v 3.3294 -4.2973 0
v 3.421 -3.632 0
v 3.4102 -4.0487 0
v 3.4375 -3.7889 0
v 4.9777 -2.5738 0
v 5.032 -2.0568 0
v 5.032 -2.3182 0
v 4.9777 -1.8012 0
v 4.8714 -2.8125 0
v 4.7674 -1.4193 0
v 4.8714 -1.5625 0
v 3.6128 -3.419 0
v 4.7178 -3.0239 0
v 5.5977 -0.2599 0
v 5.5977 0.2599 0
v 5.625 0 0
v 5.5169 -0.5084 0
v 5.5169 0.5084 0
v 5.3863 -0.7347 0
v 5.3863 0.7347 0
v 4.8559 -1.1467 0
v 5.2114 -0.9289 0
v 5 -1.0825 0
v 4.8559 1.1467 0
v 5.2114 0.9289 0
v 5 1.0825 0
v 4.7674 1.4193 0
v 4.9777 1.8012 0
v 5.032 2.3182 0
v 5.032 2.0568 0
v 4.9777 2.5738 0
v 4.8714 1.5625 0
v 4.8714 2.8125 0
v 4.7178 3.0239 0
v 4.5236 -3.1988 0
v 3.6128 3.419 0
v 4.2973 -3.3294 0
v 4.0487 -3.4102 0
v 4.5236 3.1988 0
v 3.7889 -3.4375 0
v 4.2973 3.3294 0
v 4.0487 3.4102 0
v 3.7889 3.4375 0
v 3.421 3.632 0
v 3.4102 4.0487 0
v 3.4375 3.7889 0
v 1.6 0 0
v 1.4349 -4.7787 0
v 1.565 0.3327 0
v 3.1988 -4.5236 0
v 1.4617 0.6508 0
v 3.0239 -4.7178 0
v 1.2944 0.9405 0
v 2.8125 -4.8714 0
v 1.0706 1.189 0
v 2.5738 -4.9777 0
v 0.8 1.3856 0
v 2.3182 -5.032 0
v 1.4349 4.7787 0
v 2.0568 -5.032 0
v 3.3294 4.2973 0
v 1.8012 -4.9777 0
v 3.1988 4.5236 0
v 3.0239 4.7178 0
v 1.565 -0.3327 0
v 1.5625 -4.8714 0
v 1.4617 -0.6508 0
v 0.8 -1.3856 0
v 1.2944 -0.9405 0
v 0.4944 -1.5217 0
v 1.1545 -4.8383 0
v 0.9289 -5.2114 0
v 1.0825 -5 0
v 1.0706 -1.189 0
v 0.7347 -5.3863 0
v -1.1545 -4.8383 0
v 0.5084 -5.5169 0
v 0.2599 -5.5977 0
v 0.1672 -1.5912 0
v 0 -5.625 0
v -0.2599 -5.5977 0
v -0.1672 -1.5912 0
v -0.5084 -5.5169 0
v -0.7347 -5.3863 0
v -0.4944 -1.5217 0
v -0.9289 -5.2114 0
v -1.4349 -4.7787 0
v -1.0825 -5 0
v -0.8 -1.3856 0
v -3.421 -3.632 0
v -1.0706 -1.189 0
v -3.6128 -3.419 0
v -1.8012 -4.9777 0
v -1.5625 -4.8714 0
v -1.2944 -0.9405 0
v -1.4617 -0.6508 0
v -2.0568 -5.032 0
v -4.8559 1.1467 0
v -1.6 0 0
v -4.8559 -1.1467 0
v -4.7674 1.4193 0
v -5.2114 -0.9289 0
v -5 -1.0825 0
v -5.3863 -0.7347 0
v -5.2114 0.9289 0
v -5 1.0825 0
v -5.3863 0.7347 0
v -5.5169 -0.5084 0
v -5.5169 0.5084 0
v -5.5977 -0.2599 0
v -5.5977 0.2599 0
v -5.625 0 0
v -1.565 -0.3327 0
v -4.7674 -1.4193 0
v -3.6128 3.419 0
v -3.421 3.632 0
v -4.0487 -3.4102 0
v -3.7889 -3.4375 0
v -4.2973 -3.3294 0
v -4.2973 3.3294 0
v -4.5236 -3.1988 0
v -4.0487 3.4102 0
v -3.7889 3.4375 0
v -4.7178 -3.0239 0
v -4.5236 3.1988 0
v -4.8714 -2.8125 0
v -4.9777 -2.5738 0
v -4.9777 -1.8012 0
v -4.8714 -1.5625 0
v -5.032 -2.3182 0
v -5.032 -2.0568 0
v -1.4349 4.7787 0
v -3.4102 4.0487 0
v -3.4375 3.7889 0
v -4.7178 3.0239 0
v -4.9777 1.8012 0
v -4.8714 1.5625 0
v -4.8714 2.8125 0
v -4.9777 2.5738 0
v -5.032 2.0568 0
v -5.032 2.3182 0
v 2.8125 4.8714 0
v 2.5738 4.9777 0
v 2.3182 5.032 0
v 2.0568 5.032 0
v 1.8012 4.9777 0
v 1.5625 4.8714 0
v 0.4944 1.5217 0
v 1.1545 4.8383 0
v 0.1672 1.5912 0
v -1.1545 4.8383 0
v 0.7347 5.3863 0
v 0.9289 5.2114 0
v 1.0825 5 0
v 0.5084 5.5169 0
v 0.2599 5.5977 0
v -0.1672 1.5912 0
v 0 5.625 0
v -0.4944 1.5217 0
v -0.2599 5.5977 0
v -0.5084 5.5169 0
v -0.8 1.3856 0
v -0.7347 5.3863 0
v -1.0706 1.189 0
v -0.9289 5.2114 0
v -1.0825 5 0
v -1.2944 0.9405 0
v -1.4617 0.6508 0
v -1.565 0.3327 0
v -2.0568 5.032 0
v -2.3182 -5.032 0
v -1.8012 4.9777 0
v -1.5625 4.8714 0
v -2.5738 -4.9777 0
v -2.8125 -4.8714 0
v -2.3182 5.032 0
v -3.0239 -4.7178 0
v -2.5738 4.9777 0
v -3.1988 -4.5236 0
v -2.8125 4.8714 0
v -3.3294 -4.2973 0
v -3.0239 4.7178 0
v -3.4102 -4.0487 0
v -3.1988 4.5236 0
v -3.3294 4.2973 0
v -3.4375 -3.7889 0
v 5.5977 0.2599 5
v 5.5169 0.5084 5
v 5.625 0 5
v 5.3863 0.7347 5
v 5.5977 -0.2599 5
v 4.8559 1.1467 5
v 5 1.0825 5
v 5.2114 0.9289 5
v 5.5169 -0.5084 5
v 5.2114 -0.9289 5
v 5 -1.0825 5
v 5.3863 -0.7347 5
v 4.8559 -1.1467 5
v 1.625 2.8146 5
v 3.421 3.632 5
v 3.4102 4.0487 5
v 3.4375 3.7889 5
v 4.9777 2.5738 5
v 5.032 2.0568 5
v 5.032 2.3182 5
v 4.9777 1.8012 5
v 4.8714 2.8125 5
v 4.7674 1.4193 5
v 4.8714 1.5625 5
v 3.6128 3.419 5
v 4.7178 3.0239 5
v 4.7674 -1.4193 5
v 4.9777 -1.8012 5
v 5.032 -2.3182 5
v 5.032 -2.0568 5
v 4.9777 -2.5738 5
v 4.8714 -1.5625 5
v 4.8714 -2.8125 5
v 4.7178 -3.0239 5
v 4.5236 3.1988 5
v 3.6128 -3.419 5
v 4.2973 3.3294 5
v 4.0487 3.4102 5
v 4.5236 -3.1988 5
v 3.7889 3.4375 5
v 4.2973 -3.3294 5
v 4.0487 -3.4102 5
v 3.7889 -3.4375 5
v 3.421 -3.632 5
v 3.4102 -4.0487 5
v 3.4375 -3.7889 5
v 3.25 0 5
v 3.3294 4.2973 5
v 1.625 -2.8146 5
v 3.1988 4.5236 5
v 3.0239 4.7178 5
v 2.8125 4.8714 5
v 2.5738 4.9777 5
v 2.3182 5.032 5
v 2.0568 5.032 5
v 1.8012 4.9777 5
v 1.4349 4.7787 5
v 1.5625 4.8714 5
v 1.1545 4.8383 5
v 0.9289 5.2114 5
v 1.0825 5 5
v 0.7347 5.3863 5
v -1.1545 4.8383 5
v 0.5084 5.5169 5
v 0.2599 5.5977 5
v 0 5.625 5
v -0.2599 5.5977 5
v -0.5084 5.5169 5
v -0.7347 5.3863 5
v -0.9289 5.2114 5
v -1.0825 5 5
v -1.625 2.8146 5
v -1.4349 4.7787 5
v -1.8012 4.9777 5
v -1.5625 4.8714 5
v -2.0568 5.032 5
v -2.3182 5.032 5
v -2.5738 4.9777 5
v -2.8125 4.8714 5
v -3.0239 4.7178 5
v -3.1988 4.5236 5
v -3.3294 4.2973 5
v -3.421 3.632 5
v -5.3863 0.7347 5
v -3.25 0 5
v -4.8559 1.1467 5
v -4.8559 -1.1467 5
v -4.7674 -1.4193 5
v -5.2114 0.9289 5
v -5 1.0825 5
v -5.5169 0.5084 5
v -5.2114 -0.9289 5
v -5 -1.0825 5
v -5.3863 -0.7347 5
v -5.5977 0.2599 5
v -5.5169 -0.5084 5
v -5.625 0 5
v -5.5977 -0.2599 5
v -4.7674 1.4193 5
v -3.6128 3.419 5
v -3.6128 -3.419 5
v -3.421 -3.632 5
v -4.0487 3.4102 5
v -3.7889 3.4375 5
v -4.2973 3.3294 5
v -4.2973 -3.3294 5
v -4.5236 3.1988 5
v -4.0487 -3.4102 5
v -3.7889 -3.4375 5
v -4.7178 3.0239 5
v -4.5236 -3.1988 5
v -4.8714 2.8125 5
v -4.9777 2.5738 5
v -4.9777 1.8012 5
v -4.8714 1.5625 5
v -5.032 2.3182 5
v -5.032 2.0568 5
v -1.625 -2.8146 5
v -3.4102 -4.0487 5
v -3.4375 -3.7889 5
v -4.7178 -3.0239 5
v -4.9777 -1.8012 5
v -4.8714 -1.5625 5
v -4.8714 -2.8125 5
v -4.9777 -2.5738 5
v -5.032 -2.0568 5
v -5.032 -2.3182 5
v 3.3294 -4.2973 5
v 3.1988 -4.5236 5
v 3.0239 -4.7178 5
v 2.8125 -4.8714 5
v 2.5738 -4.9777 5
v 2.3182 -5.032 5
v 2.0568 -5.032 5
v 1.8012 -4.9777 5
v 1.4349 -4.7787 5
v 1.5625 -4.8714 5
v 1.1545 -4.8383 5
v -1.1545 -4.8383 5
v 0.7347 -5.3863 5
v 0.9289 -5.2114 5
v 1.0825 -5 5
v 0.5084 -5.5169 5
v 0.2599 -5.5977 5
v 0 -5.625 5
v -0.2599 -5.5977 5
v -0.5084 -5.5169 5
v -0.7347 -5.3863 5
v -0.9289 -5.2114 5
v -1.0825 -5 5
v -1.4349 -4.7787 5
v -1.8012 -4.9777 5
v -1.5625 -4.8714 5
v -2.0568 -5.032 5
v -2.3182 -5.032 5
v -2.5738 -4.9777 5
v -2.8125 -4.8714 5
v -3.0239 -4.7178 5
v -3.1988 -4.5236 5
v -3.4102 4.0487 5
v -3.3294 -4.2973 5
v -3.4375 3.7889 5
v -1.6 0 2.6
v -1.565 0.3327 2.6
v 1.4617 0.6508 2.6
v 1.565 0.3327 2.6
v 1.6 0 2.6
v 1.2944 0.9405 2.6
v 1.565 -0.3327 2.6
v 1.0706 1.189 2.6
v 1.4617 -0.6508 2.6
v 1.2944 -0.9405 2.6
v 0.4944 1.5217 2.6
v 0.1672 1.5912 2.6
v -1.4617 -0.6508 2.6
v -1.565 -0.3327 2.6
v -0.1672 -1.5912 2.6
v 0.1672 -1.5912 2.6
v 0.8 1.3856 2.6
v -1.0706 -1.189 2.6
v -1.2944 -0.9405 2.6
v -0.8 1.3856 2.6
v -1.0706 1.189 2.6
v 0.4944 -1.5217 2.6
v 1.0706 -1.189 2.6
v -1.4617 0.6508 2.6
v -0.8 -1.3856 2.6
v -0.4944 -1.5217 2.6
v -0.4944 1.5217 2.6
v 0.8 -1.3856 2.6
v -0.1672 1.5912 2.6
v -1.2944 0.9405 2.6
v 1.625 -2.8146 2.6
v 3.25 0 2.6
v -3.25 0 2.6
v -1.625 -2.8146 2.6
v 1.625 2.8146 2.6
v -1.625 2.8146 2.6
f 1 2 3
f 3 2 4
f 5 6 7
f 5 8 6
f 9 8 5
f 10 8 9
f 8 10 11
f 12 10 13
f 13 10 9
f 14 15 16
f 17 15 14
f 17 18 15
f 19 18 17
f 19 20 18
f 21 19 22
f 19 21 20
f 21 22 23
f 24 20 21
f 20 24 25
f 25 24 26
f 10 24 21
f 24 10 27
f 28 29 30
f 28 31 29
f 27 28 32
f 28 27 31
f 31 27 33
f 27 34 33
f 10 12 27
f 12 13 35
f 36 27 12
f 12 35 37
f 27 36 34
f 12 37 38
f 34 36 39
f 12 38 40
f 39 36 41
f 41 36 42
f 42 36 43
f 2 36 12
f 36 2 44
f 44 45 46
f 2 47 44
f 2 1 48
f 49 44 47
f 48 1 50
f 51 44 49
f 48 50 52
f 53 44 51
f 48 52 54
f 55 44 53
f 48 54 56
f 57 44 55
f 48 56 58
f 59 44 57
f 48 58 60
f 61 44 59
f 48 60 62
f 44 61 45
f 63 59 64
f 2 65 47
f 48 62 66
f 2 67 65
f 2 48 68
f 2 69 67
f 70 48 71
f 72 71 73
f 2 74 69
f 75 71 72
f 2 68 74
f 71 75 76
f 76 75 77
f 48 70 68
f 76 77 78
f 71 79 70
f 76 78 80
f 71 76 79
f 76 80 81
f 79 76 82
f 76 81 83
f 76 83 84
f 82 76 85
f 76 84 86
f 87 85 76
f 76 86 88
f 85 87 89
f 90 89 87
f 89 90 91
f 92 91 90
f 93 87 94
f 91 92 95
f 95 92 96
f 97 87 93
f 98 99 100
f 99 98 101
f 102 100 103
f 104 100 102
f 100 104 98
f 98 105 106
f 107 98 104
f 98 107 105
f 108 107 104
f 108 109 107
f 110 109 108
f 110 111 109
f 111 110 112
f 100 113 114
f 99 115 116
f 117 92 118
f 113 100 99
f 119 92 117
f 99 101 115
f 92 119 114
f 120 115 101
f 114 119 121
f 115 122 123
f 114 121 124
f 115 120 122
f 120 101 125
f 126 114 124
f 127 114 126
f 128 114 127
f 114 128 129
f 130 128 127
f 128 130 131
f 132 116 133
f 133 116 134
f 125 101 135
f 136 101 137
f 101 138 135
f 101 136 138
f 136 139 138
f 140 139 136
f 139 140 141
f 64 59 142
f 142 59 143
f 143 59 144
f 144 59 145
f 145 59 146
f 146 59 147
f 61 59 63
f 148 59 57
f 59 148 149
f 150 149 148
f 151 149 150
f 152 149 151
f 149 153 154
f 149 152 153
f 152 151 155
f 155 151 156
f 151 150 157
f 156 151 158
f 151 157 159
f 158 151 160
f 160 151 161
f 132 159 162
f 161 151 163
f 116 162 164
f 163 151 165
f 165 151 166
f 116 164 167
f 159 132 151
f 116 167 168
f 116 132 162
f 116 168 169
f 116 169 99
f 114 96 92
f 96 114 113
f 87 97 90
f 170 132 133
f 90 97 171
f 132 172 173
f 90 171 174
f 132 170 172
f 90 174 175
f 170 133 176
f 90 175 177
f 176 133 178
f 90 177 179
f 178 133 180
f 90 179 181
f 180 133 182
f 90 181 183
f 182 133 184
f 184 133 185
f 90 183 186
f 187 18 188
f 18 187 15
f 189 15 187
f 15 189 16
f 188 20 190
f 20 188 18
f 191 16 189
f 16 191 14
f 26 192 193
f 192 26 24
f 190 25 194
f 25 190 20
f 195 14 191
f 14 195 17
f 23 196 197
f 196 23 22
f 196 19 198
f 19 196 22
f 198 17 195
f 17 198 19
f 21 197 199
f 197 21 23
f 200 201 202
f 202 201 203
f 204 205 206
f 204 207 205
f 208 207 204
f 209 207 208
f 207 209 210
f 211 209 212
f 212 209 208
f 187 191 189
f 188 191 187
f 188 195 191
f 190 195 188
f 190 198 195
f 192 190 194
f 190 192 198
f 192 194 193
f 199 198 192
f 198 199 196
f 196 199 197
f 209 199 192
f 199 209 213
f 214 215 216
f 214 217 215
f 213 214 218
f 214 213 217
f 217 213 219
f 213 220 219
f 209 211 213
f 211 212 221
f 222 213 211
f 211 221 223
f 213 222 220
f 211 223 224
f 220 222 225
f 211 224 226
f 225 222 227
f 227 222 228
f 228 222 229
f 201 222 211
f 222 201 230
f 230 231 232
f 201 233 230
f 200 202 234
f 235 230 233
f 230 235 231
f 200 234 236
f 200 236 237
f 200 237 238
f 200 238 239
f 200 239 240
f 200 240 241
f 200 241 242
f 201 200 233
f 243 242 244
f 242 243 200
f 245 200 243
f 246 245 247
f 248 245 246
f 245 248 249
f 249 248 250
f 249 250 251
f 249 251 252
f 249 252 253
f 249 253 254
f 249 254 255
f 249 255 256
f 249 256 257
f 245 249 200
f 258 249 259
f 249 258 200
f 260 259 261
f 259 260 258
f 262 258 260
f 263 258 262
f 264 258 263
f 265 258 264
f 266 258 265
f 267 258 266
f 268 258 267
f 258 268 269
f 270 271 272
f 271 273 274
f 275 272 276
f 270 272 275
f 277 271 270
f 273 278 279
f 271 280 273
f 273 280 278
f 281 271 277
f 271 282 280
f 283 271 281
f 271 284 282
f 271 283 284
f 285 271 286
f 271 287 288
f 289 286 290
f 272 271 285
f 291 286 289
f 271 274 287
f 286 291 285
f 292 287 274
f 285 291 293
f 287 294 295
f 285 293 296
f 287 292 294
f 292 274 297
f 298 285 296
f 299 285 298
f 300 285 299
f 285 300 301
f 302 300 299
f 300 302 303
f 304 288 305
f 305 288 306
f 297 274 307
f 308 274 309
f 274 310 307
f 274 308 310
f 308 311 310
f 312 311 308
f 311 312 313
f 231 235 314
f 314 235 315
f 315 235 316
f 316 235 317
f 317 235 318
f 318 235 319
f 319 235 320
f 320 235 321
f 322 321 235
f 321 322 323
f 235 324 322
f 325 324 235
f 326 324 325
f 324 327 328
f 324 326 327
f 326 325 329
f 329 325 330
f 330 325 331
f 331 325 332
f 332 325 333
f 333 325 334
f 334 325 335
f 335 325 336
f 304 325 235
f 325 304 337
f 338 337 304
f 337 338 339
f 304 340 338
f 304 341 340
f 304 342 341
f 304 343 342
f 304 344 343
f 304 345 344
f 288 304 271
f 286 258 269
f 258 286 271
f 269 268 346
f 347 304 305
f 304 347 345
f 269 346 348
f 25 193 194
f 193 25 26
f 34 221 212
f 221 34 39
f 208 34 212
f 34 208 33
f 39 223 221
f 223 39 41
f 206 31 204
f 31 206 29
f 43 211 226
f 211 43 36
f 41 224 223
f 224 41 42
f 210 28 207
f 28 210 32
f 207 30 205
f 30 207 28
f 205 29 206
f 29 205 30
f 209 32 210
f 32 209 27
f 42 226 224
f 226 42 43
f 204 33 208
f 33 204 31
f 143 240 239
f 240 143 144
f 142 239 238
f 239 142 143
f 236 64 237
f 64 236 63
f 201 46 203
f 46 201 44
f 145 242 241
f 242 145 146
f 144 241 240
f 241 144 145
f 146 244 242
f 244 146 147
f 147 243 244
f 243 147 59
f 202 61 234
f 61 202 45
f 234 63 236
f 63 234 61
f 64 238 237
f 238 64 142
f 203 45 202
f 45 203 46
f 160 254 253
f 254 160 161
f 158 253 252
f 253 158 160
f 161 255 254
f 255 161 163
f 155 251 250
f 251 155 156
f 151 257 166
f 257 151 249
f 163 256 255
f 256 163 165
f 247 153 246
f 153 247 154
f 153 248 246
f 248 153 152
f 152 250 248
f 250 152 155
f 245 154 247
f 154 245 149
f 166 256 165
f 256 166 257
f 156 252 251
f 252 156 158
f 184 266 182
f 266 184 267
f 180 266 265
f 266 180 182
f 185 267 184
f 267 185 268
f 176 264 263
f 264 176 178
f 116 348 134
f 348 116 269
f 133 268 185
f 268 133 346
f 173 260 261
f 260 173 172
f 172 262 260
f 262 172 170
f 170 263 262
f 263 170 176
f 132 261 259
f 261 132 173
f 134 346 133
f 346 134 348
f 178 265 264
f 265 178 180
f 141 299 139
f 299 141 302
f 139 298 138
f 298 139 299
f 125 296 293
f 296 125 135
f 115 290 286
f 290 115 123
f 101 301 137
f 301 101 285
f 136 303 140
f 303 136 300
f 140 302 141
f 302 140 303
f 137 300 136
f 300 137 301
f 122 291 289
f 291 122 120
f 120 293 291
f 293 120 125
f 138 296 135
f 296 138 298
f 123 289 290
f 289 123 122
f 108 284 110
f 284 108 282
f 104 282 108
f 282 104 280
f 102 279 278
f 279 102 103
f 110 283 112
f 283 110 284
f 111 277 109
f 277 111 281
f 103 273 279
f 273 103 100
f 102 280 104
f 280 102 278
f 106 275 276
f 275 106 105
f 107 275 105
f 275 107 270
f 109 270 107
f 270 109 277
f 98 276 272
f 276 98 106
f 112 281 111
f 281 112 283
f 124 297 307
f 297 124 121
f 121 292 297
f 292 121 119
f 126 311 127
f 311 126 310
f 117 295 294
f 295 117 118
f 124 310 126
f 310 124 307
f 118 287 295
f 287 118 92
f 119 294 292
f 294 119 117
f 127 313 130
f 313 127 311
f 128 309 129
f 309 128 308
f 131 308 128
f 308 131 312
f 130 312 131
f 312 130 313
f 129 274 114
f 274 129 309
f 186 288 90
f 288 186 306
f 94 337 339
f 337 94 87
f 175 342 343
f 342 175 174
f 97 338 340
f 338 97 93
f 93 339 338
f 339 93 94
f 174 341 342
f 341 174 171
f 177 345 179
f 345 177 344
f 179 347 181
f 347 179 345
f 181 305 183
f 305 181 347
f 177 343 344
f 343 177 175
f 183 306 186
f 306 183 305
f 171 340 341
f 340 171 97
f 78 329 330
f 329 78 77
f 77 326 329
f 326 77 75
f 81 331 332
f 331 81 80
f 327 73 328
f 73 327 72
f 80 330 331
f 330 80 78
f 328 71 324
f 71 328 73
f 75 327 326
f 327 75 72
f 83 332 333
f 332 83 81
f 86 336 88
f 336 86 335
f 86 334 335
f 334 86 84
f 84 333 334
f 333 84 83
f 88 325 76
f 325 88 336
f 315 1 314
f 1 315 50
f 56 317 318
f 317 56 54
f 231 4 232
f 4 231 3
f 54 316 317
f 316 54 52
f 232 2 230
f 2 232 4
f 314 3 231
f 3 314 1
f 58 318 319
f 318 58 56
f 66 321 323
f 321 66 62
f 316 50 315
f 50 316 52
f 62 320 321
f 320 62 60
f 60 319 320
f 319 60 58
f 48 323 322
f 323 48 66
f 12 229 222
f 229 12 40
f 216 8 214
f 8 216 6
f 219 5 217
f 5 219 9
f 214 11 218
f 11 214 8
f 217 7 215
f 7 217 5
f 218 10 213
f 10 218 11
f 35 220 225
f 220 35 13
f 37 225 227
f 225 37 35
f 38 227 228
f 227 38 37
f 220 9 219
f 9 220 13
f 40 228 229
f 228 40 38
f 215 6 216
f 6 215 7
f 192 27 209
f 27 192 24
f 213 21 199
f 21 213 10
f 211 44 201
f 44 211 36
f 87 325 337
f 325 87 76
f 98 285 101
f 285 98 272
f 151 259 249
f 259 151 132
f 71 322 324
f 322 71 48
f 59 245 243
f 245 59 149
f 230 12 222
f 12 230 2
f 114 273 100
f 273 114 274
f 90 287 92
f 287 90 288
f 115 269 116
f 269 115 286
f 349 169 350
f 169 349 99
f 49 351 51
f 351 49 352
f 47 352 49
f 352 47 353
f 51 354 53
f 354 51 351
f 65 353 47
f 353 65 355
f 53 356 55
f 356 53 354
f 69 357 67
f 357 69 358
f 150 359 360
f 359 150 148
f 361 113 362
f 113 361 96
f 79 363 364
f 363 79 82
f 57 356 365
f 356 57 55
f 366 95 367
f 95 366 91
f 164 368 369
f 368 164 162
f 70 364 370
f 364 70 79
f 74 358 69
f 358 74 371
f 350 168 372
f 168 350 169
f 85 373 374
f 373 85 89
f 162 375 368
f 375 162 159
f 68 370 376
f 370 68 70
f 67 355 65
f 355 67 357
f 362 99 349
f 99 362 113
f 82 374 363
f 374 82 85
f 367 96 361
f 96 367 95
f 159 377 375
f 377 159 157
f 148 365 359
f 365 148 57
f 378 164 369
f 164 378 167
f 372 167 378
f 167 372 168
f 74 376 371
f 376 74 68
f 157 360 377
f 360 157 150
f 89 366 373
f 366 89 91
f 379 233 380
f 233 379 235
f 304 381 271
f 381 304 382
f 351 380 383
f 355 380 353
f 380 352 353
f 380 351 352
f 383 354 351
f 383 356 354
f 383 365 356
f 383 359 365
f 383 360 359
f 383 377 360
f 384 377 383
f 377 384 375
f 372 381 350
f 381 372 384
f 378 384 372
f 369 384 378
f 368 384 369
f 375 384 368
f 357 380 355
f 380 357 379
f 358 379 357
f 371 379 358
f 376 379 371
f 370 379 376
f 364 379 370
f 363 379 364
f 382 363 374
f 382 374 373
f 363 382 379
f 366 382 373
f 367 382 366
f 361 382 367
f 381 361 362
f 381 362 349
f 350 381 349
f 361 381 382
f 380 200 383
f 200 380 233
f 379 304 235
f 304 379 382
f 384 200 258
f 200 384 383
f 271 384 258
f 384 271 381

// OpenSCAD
ribs = 12;
rib_angle = 360/ribs;
rib_size = 2.5;
size=10;
height = 5;

rib_pos = size/2 - rib_size/4;

$fn=30;

module nut() {
    hull() {
        cylinder(d = 6.5, h=2.4, $fn=6);
        translate([0,0,2.4]) cylinder(d = 3.2, h=1.2, $fn=20);
    }
}

module rib() {
    translate([rib_pos,0,0]) cylinder(d=rib_size, h=height, $fn=30);
}


difference() {
    union() {
        cylinder(d=size, h=height, $fn=30);
        for(pos=[0:ribs-1]) {
            rotate([0,0,pos*rib_angle]) rib();
        }
    }
    cylinder(d=3.2, h=5);
    translate([0,0,height-2.4]) nut();
}
